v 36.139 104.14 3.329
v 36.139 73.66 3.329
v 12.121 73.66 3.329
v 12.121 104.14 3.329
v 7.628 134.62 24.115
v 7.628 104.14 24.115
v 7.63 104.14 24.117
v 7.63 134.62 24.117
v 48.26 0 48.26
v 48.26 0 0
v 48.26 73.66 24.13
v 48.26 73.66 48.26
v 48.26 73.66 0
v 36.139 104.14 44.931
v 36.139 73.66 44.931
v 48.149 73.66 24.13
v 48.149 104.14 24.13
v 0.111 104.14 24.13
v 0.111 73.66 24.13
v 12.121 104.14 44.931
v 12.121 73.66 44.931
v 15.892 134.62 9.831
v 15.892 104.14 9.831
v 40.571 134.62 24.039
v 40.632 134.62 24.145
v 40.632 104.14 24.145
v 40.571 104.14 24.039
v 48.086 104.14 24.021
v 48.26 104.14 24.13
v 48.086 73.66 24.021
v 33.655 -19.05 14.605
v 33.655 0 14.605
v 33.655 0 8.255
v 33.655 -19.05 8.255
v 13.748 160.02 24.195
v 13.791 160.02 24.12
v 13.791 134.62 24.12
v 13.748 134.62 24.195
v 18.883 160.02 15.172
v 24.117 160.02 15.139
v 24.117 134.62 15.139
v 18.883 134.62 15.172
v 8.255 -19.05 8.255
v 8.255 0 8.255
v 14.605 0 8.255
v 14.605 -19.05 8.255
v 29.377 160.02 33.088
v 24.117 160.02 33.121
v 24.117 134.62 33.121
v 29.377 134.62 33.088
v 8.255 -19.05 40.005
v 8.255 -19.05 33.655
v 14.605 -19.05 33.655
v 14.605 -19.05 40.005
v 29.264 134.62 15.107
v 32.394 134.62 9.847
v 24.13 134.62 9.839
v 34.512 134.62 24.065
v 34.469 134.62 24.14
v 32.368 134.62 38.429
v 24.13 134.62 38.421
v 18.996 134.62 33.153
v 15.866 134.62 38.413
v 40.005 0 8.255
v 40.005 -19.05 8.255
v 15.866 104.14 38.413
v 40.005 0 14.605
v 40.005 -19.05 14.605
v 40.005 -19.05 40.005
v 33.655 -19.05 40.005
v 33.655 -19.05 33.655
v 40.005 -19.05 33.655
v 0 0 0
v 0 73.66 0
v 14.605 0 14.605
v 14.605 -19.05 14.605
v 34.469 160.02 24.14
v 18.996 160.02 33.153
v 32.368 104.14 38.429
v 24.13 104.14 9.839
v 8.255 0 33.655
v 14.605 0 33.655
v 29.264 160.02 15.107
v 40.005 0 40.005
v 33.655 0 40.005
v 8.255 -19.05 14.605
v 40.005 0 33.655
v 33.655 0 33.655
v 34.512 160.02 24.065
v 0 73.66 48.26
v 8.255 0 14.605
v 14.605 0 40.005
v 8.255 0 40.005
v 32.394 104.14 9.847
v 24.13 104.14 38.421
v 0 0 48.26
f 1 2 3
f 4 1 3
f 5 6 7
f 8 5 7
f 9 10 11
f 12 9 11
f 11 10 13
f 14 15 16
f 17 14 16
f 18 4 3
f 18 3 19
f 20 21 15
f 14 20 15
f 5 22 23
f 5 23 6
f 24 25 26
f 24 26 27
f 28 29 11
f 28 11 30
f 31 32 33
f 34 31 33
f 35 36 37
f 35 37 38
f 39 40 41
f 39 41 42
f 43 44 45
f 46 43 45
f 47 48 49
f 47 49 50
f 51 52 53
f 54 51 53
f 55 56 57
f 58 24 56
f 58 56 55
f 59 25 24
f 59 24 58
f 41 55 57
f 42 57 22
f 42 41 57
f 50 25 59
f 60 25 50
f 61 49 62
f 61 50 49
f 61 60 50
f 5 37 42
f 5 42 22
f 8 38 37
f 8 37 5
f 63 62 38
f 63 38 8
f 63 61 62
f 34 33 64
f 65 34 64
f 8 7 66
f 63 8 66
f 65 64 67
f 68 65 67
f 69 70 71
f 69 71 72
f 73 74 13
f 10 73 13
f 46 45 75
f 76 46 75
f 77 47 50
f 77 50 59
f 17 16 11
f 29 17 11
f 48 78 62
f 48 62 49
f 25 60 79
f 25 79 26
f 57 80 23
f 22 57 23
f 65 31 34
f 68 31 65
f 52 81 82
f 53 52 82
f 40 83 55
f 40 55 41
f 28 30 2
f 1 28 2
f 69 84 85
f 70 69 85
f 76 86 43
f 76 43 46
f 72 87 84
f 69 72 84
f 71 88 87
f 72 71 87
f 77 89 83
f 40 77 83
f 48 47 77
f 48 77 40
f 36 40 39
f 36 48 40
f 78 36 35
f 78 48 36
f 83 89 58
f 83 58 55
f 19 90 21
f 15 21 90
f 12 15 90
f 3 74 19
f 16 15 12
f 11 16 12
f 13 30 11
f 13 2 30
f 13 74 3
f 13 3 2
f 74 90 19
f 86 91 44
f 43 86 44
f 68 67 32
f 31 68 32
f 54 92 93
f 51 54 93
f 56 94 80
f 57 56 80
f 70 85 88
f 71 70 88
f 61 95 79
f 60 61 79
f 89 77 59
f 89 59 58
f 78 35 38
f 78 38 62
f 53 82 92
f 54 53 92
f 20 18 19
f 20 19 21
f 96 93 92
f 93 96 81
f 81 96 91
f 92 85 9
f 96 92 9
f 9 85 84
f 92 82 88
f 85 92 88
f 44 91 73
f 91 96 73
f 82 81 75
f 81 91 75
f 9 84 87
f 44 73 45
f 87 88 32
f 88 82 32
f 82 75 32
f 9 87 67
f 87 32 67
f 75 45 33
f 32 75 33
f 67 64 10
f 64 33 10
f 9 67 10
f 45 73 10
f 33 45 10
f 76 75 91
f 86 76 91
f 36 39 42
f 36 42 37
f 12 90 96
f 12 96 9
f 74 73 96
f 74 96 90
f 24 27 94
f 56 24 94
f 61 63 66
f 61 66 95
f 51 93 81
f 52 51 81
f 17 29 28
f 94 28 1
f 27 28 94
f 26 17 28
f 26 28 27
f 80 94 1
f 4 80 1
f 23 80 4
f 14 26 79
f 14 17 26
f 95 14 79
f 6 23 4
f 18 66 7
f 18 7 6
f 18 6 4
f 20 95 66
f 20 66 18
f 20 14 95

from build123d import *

# Parameters (mm, degrees)
F0_W     = 48.26
F0_H     = 73.66
F1_DEPTH = 48.26
F3_DEPTH = 30.48
F5_DEPTH = 30.48
F7_DEPTH = 25.4
F8_W     = 3.175
F8_H     = 3.175
F9_DEPTH = 19.05


with BuildPart() as f1:
    # F0 (on Top) → F1 (new body)
    with BuildSketch(Plane.XY):
        with Locations((24.13, 36.83)):
            Rectangle(F0_W, F0_H)
    extrude(amount=F1_DEPTH)

    # F2 (on face) → F3 (join)
    with BuildSketch(Plane(origin=(0, 73.66, 0), x_dir=(-1, 0, 0), z_dir=(0, 1, 0))):
        Polygon((-12.1206499105, 44.9308045208), (-24.13, 44.9308045208), (-24.13, 24.13), (-24.13, 9.0534836054), (-48.0858952621, 24.0212186931), (-36.1393500895, 3.3291954792), (-12.1206499105, 3.3291954792), (-0.1112998211, 24.13), align=None)
        Polygon((-24.13, 24.13), (-24.13, 44.9308045208), (-36.1393500895, 44.9308045208), (-48.1487001789, 24.13), align=None)
        Polygon((-24.13, 9.0534836054), (-24.13, 24.13), (-48.1487001789, 24.13), (-48.0858952621, 24.0212186931), align=None)
        Polygon((-48.0858952621, 24.0212186931), (-48.1487001789, 24.13), (-48.26, 24.13), align=None)
    extrude(amount=F3_DEPTH)

    # F4 (on face) → F5 (join)
    with BuildSketch(Plane(origin=(0, 104.14, 0), x_dir=(-1, 0, 0), z_dir=(0, 1, 0))):
        Polygon((-15.8659655868, 38.4132767837), (-24.13, 38.4209016232), (-24.13, 24.0781502233), (-7.6297935663, 24.1173632016), align=None)
        Polygon((-24.13, 24.0781502233), (-24.13, 38.4209016232), (-32.3676633374, 38.4285021314), (-40.6316977506, 24.1452253477), (-40.5705446588, 24.0390790321), align=None)
        Polygon((-7.6297935663, 24.1173632016), (-24.13, 24.0781502233), (-24.13, 9.8390983768), (-15.8923366626, 9.8314978686), (-7.6283022494, 24.1147746523), align=None)
        Polygon((-24.13, 9.8390983768), (-24.13, 24.0781502233), (-40.5705446588, 24.0390790321), (-32.3940344132, 9.8467232163), align=None)
    extrude(amount=F5_DEPTH)

    # F6 (on face) → F7 (join)
    with BuildSketch(Plane(origin=(0, 134.62, 0), x_dir=(-1, 0, 0), z_dir=(0, 1, 0))):
        Polygon((-18.9955281103, 33.1531956374), (-24.1168144621, 33.1211234563), (-24.1168144621, 24.1299878343), (-13.7908709872, 24.1204605673), (-13.7484474098, 24.1950147272), align=None)
        Polygon((-24.1168144621, 24.1299878343), (-24.1168144621, 33.1211234563), (-29.3770807004, 33.0881809102), (-34.4691290128, 24.1395394327), align=None)
        Polygon((-13.7908709872, 24.1204605673), (-24.1168144621, 24.1299878343), (-24.1168144621, 15.1390416932), (-18.8829192996, 15.1718190898), align=None)
        Polygon((-24.1168144621, 15.1390416932), (-24.1168144621, 24.1299878343), (-34.4691290128, 24.1395394327), (-34.5115525902, 24.0649852728), (-29.2644718897, 15.1068043626), align=None)
    extrude(amount=F7_DEPTH)

    # F8 (on face) → F9 (join)
    with BuildSketch(Plane.XZ):
        Polygon((40.005, 40.005), (36.83, 40.005), (36.83, 36.83), (36.83, 33.655), (40.005, 33.655), align=None)
        Polygon((36.83, 36.83), (36.83, 40.005), (33.655, 40.005), (33.655, 33.655), (36.83, 33.655), align=None)
        Polygon((8.255, 33.655), (11.43, 33.655), (14.605, 33.655), (14.605, 40.005), (8.255, 40.005), align=None)
        Polygon((14.605, 8.255), (14.605, 11.43), (11.43, 11.43), (11.43, 14.605), (8.255, 14.605), (8.255, 8.255), align=None)
        with Locations((13.0175, 13.0175)):
            Rectangle(F8_W, F8_H)
        Polygon((40.005, 14.605), (36.83, 14.605), (36.83, 11.43), (33.655, 11.43), (33.655, 8.255), (40.005, 8.255), align=None)
        with Locations((35.2425, 13.0175)):
            Rectangle(F8_W, F8_H)
    extrude(amount=F9_DEPTH)


solid = f1.part
